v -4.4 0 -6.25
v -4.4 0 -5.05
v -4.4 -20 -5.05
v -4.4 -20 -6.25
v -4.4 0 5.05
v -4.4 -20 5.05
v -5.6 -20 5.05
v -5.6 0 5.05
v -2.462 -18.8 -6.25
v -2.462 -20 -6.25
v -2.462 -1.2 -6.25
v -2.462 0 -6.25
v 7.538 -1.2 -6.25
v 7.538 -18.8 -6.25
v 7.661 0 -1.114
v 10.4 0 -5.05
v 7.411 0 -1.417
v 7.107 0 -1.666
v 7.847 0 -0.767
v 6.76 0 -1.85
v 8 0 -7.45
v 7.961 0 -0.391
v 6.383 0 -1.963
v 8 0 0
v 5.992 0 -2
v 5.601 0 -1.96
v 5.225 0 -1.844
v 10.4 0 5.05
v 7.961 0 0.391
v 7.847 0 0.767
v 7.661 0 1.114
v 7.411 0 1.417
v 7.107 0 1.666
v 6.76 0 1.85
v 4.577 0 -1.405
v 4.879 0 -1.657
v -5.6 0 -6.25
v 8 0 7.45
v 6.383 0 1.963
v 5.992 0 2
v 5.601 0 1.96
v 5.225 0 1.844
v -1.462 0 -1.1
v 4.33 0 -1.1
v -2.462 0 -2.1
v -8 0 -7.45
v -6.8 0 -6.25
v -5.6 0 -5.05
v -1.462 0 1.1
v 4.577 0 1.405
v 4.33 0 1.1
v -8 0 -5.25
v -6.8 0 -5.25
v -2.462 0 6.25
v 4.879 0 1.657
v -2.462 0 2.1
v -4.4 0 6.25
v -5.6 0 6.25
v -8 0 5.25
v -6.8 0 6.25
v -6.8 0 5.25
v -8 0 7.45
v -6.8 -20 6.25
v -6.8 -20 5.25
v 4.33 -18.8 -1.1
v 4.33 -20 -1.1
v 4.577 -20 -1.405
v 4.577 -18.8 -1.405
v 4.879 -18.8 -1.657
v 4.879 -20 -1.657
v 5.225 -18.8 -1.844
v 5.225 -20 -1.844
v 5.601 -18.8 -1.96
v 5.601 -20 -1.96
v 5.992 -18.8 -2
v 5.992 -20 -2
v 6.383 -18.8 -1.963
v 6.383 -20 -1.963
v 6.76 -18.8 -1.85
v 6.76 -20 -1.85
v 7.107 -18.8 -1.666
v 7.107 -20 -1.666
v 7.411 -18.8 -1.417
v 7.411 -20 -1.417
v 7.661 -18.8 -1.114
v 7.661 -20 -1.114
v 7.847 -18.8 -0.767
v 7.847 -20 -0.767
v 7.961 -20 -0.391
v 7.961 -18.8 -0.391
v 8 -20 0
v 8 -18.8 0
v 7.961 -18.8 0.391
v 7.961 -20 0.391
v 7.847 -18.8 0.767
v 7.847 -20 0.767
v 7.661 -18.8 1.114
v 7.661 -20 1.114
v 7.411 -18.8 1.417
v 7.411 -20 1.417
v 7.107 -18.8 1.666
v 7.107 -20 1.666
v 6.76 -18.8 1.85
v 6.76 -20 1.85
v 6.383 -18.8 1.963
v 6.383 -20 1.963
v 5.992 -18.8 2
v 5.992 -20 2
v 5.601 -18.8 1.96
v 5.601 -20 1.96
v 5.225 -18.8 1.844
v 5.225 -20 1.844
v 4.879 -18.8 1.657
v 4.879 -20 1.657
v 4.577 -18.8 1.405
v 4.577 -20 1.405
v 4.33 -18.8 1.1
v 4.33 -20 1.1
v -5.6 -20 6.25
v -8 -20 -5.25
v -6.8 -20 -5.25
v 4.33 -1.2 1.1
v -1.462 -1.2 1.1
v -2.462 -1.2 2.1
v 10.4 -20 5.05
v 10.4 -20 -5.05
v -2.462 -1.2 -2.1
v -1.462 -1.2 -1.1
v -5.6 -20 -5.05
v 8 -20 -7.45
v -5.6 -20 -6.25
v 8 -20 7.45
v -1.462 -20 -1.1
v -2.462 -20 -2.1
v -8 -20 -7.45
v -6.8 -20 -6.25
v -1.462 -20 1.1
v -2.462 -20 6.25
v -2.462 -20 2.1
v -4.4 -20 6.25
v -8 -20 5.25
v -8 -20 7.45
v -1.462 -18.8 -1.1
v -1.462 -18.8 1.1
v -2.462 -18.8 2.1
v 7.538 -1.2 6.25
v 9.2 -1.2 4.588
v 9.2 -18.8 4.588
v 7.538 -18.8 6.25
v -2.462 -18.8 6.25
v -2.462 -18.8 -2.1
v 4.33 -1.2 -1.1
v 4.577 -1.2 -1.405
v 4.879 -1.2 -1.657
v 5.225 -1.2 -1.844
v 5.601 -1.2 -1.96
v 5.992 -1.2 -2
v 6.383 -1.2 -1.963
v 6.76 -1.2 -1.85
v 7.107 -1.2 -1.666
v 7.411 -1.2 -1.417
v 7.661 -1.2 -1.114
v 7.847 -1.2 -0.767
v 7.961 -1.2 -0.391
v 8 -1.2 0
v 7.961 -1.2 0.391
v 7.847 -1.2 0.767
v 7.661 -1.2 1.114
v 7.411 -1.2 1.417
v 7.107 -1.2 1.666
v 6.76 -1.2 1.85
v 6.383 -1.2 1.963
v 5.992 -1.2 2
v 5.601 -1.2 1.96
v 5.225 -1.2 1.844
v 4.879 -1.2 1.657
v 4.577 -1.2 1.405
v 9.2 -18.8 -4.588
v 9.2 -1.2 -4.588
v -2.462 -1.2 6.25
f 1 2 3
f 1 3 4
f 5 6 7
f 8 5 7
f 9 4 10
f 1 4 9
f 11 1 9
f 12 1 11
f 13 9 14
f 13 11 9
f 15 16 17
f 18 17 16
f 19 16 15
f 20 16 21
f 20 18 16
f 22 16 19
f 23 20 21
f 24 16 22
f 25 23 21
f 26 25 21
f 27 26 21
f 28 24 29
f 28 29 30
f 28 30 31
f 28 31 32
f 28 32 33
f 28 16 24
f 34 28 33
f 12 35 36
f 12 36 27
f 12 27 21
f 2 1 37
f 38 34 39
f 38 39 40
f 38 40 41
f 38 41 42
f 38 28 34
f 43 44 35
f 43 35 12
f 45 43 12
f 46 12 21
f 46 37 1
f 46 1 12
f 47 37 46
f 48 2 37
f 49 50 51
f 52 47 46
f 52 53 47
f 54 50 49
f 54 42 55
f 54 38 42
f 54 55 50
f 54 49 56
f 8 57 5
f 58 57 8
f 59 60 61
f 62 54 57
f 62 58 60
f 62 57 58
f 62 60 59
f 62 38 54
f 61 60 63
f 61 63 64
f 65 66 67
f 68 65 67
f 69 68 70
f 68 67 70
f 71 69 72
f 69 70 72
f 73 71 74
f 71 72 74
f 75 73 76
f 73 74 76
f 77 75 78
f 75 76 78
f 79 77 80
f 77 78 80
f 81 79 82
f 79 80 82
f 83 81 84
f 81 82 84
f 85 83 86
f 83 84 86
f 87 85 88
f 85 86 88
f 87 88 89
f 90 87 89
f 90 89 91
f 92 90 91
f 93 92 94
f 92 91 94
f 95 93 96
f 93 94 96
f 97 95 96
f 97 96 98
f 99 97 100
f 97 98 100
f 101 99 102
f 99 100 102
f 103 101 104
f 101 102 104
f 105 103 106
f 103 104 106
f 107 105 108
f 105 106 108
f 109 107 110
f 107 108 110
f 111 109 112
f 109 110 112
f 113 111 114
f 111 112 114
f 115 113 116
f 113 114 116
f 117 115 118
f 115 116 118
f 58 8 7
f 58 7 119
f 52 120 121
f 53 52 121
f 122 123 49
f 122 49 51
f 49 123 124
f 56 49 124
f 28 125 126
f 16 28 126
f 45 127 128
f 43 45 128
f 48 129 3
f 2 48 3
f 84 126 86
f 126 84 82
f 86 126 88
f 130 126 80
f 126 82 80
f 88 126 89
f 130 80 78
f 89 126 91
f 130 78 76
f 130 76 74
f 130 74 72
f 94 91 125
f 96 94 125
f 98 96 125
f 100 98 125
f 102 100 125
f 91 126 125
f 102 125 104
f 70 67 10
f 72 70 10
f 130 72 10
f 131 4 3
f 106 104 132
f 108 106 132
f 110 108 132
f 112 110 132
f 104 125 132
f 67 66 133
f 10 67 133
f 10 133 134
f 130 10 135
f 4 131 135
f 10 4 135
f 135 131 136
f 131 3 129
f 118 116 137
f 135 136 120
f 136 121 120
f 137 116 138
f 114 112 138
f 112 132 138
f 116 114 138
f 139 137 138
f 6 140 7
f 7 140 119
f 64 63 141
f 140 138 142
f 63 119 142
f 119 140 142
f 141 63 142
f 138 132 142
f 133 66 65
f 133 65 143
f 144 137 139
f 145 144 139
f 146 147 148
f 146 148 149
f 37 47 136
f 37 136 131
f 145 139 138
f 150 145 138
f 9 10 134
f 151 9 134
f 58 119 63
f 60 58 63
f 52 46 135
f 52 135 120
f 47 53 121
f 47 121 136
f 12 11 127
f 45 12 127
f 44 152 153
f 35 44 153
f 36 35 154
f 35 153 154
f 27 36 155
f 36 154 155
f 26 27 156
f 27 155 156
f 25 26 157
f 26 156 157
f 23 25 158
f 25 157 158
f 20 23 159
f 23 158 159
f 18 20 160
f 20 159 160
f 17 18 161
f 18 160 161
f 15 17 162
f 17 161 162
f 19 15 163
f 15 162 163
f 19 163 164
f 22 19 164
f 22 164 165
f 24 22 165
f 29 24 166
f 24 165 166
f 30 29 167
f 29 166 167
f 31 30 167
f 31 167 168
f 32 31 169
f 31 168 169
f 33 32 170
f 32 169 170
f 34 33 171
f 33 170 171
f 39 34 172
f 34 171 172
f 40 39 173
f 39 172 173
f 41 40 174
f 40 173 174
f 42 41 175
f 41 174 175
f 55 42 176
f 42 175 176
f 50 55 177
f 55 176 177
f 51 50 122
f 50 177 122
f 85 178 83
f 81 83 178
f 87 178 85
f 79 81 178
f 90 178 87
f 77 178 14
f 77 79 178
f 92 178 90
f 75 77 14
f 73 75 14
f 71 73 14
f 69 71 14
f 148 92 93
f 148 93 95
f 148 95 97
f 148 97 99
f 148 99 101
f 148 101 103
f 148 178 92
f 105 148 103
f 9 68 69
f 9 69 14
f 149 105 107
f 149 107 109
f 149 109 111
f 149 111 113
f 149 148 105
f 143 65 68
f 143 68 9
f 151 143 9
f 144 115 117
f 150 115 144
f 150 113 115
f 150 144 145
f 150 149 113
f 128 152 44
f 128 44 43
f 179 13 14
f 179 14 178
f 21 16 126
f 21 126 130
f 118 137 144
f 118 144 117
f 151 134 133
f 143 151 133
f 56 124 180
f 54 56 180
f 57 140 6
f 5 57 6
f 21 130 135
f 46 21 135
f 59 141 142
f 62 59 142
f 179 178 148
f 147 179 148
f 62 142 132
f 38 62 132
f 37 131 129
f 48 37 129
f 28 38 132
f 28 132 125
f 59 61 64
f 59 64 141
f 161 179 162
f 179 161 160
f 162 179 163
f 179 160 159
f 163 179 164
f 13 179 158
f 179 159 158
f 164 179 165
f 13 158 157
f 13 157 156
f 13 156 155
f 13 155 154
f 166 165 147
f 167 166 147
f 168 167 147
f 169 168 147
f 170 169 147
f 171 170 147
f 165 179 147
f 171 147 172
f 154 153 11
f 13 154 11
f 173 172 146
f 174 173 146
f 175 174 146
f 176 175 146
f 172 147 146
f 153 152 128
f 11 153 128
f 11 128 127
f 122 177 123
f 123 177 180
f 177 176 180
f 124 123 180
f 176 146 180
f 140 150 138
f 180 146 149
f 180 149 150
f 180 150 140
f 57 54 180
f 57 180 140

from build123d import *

# Parameters (mm, degrees)
PAD_DEPTH           = 20
PAD001_DEPTH        = 1.2
LINEARPATTERN_COUNT = 2
LINEARPATTERN_PITCH = 18.8


with BuildPart() as part:
    # Sketch → Pad (new body)
    with BuildSketch(Plane.XZ):
        Polygon((-8, 7.45), (8, 7.45), (10.4, 5.05), (10.4, -5.05), (8, -7.45), (-8, -7.45), (-8, -5.25), (-6.8, -5.25), (-6.8, -6.25), (-5.6, -6.25), (-5.6, -5.05), (-4.4, -5.05), (-4.4, -6.25), (7.538299, -6.25), (9.2, -4.588299), (9.2, 4.588299), (7.538299, 6.25), (-4.4, 6.25), (-4.4, 5.05), (-5.6, 5.05), (-5.6, 6.25), (-6.8, 6.25), (-6.8, 5.25), (-8, 5.25), align=None)
    extrude(amount=PAD_DEPTH)

    # Sketch001 (on DatumPlane) → Pad001 (join)
    with BuildSketch(Plane.XZ.offset(20)):
        with BuildLine():
            Line((-2.461701, 6.25), (7.538299, 6.25))
            Line((7.538299, 6.25), (9.2, 4.588299))
            Line((9.2, 4.588299), (9.2, -4.588299))
            Line((9.2, -4.588299), (7.538299, -6.25))
            Line((-2.461701, -6.25), (7.538299, -6.25))
            Line((-2.461701, -6.25), (-2.461701, -2.1))
            Line((-2.461701, -2.1), (-1.461701, -1.1))
            Line((4.329671, -1.1), (-1.461701, -1.1))
            ThreePointArc((4.329671, -1.1), (8, 0), (4.329671, 1.1))
            Line((-1.461701, 1.1), (4.329671, 1.1))
            Line((-1.461701, 1.1), (-2.461701, 2.1))
            Line((-2.461701, 2.1), (-2.461701, 6.25))
        make_face()
    pad001 = extrude(amount=-PAD001_DEPTH)

    # LinearPattern: Pad001 ×2
    with Locations(*[(0, i * LINEARPATTERN_PITCH, 0) for i in range(1, LINEARPATTERN_COUNT)]):
        add(pad001)


solid = part.part
